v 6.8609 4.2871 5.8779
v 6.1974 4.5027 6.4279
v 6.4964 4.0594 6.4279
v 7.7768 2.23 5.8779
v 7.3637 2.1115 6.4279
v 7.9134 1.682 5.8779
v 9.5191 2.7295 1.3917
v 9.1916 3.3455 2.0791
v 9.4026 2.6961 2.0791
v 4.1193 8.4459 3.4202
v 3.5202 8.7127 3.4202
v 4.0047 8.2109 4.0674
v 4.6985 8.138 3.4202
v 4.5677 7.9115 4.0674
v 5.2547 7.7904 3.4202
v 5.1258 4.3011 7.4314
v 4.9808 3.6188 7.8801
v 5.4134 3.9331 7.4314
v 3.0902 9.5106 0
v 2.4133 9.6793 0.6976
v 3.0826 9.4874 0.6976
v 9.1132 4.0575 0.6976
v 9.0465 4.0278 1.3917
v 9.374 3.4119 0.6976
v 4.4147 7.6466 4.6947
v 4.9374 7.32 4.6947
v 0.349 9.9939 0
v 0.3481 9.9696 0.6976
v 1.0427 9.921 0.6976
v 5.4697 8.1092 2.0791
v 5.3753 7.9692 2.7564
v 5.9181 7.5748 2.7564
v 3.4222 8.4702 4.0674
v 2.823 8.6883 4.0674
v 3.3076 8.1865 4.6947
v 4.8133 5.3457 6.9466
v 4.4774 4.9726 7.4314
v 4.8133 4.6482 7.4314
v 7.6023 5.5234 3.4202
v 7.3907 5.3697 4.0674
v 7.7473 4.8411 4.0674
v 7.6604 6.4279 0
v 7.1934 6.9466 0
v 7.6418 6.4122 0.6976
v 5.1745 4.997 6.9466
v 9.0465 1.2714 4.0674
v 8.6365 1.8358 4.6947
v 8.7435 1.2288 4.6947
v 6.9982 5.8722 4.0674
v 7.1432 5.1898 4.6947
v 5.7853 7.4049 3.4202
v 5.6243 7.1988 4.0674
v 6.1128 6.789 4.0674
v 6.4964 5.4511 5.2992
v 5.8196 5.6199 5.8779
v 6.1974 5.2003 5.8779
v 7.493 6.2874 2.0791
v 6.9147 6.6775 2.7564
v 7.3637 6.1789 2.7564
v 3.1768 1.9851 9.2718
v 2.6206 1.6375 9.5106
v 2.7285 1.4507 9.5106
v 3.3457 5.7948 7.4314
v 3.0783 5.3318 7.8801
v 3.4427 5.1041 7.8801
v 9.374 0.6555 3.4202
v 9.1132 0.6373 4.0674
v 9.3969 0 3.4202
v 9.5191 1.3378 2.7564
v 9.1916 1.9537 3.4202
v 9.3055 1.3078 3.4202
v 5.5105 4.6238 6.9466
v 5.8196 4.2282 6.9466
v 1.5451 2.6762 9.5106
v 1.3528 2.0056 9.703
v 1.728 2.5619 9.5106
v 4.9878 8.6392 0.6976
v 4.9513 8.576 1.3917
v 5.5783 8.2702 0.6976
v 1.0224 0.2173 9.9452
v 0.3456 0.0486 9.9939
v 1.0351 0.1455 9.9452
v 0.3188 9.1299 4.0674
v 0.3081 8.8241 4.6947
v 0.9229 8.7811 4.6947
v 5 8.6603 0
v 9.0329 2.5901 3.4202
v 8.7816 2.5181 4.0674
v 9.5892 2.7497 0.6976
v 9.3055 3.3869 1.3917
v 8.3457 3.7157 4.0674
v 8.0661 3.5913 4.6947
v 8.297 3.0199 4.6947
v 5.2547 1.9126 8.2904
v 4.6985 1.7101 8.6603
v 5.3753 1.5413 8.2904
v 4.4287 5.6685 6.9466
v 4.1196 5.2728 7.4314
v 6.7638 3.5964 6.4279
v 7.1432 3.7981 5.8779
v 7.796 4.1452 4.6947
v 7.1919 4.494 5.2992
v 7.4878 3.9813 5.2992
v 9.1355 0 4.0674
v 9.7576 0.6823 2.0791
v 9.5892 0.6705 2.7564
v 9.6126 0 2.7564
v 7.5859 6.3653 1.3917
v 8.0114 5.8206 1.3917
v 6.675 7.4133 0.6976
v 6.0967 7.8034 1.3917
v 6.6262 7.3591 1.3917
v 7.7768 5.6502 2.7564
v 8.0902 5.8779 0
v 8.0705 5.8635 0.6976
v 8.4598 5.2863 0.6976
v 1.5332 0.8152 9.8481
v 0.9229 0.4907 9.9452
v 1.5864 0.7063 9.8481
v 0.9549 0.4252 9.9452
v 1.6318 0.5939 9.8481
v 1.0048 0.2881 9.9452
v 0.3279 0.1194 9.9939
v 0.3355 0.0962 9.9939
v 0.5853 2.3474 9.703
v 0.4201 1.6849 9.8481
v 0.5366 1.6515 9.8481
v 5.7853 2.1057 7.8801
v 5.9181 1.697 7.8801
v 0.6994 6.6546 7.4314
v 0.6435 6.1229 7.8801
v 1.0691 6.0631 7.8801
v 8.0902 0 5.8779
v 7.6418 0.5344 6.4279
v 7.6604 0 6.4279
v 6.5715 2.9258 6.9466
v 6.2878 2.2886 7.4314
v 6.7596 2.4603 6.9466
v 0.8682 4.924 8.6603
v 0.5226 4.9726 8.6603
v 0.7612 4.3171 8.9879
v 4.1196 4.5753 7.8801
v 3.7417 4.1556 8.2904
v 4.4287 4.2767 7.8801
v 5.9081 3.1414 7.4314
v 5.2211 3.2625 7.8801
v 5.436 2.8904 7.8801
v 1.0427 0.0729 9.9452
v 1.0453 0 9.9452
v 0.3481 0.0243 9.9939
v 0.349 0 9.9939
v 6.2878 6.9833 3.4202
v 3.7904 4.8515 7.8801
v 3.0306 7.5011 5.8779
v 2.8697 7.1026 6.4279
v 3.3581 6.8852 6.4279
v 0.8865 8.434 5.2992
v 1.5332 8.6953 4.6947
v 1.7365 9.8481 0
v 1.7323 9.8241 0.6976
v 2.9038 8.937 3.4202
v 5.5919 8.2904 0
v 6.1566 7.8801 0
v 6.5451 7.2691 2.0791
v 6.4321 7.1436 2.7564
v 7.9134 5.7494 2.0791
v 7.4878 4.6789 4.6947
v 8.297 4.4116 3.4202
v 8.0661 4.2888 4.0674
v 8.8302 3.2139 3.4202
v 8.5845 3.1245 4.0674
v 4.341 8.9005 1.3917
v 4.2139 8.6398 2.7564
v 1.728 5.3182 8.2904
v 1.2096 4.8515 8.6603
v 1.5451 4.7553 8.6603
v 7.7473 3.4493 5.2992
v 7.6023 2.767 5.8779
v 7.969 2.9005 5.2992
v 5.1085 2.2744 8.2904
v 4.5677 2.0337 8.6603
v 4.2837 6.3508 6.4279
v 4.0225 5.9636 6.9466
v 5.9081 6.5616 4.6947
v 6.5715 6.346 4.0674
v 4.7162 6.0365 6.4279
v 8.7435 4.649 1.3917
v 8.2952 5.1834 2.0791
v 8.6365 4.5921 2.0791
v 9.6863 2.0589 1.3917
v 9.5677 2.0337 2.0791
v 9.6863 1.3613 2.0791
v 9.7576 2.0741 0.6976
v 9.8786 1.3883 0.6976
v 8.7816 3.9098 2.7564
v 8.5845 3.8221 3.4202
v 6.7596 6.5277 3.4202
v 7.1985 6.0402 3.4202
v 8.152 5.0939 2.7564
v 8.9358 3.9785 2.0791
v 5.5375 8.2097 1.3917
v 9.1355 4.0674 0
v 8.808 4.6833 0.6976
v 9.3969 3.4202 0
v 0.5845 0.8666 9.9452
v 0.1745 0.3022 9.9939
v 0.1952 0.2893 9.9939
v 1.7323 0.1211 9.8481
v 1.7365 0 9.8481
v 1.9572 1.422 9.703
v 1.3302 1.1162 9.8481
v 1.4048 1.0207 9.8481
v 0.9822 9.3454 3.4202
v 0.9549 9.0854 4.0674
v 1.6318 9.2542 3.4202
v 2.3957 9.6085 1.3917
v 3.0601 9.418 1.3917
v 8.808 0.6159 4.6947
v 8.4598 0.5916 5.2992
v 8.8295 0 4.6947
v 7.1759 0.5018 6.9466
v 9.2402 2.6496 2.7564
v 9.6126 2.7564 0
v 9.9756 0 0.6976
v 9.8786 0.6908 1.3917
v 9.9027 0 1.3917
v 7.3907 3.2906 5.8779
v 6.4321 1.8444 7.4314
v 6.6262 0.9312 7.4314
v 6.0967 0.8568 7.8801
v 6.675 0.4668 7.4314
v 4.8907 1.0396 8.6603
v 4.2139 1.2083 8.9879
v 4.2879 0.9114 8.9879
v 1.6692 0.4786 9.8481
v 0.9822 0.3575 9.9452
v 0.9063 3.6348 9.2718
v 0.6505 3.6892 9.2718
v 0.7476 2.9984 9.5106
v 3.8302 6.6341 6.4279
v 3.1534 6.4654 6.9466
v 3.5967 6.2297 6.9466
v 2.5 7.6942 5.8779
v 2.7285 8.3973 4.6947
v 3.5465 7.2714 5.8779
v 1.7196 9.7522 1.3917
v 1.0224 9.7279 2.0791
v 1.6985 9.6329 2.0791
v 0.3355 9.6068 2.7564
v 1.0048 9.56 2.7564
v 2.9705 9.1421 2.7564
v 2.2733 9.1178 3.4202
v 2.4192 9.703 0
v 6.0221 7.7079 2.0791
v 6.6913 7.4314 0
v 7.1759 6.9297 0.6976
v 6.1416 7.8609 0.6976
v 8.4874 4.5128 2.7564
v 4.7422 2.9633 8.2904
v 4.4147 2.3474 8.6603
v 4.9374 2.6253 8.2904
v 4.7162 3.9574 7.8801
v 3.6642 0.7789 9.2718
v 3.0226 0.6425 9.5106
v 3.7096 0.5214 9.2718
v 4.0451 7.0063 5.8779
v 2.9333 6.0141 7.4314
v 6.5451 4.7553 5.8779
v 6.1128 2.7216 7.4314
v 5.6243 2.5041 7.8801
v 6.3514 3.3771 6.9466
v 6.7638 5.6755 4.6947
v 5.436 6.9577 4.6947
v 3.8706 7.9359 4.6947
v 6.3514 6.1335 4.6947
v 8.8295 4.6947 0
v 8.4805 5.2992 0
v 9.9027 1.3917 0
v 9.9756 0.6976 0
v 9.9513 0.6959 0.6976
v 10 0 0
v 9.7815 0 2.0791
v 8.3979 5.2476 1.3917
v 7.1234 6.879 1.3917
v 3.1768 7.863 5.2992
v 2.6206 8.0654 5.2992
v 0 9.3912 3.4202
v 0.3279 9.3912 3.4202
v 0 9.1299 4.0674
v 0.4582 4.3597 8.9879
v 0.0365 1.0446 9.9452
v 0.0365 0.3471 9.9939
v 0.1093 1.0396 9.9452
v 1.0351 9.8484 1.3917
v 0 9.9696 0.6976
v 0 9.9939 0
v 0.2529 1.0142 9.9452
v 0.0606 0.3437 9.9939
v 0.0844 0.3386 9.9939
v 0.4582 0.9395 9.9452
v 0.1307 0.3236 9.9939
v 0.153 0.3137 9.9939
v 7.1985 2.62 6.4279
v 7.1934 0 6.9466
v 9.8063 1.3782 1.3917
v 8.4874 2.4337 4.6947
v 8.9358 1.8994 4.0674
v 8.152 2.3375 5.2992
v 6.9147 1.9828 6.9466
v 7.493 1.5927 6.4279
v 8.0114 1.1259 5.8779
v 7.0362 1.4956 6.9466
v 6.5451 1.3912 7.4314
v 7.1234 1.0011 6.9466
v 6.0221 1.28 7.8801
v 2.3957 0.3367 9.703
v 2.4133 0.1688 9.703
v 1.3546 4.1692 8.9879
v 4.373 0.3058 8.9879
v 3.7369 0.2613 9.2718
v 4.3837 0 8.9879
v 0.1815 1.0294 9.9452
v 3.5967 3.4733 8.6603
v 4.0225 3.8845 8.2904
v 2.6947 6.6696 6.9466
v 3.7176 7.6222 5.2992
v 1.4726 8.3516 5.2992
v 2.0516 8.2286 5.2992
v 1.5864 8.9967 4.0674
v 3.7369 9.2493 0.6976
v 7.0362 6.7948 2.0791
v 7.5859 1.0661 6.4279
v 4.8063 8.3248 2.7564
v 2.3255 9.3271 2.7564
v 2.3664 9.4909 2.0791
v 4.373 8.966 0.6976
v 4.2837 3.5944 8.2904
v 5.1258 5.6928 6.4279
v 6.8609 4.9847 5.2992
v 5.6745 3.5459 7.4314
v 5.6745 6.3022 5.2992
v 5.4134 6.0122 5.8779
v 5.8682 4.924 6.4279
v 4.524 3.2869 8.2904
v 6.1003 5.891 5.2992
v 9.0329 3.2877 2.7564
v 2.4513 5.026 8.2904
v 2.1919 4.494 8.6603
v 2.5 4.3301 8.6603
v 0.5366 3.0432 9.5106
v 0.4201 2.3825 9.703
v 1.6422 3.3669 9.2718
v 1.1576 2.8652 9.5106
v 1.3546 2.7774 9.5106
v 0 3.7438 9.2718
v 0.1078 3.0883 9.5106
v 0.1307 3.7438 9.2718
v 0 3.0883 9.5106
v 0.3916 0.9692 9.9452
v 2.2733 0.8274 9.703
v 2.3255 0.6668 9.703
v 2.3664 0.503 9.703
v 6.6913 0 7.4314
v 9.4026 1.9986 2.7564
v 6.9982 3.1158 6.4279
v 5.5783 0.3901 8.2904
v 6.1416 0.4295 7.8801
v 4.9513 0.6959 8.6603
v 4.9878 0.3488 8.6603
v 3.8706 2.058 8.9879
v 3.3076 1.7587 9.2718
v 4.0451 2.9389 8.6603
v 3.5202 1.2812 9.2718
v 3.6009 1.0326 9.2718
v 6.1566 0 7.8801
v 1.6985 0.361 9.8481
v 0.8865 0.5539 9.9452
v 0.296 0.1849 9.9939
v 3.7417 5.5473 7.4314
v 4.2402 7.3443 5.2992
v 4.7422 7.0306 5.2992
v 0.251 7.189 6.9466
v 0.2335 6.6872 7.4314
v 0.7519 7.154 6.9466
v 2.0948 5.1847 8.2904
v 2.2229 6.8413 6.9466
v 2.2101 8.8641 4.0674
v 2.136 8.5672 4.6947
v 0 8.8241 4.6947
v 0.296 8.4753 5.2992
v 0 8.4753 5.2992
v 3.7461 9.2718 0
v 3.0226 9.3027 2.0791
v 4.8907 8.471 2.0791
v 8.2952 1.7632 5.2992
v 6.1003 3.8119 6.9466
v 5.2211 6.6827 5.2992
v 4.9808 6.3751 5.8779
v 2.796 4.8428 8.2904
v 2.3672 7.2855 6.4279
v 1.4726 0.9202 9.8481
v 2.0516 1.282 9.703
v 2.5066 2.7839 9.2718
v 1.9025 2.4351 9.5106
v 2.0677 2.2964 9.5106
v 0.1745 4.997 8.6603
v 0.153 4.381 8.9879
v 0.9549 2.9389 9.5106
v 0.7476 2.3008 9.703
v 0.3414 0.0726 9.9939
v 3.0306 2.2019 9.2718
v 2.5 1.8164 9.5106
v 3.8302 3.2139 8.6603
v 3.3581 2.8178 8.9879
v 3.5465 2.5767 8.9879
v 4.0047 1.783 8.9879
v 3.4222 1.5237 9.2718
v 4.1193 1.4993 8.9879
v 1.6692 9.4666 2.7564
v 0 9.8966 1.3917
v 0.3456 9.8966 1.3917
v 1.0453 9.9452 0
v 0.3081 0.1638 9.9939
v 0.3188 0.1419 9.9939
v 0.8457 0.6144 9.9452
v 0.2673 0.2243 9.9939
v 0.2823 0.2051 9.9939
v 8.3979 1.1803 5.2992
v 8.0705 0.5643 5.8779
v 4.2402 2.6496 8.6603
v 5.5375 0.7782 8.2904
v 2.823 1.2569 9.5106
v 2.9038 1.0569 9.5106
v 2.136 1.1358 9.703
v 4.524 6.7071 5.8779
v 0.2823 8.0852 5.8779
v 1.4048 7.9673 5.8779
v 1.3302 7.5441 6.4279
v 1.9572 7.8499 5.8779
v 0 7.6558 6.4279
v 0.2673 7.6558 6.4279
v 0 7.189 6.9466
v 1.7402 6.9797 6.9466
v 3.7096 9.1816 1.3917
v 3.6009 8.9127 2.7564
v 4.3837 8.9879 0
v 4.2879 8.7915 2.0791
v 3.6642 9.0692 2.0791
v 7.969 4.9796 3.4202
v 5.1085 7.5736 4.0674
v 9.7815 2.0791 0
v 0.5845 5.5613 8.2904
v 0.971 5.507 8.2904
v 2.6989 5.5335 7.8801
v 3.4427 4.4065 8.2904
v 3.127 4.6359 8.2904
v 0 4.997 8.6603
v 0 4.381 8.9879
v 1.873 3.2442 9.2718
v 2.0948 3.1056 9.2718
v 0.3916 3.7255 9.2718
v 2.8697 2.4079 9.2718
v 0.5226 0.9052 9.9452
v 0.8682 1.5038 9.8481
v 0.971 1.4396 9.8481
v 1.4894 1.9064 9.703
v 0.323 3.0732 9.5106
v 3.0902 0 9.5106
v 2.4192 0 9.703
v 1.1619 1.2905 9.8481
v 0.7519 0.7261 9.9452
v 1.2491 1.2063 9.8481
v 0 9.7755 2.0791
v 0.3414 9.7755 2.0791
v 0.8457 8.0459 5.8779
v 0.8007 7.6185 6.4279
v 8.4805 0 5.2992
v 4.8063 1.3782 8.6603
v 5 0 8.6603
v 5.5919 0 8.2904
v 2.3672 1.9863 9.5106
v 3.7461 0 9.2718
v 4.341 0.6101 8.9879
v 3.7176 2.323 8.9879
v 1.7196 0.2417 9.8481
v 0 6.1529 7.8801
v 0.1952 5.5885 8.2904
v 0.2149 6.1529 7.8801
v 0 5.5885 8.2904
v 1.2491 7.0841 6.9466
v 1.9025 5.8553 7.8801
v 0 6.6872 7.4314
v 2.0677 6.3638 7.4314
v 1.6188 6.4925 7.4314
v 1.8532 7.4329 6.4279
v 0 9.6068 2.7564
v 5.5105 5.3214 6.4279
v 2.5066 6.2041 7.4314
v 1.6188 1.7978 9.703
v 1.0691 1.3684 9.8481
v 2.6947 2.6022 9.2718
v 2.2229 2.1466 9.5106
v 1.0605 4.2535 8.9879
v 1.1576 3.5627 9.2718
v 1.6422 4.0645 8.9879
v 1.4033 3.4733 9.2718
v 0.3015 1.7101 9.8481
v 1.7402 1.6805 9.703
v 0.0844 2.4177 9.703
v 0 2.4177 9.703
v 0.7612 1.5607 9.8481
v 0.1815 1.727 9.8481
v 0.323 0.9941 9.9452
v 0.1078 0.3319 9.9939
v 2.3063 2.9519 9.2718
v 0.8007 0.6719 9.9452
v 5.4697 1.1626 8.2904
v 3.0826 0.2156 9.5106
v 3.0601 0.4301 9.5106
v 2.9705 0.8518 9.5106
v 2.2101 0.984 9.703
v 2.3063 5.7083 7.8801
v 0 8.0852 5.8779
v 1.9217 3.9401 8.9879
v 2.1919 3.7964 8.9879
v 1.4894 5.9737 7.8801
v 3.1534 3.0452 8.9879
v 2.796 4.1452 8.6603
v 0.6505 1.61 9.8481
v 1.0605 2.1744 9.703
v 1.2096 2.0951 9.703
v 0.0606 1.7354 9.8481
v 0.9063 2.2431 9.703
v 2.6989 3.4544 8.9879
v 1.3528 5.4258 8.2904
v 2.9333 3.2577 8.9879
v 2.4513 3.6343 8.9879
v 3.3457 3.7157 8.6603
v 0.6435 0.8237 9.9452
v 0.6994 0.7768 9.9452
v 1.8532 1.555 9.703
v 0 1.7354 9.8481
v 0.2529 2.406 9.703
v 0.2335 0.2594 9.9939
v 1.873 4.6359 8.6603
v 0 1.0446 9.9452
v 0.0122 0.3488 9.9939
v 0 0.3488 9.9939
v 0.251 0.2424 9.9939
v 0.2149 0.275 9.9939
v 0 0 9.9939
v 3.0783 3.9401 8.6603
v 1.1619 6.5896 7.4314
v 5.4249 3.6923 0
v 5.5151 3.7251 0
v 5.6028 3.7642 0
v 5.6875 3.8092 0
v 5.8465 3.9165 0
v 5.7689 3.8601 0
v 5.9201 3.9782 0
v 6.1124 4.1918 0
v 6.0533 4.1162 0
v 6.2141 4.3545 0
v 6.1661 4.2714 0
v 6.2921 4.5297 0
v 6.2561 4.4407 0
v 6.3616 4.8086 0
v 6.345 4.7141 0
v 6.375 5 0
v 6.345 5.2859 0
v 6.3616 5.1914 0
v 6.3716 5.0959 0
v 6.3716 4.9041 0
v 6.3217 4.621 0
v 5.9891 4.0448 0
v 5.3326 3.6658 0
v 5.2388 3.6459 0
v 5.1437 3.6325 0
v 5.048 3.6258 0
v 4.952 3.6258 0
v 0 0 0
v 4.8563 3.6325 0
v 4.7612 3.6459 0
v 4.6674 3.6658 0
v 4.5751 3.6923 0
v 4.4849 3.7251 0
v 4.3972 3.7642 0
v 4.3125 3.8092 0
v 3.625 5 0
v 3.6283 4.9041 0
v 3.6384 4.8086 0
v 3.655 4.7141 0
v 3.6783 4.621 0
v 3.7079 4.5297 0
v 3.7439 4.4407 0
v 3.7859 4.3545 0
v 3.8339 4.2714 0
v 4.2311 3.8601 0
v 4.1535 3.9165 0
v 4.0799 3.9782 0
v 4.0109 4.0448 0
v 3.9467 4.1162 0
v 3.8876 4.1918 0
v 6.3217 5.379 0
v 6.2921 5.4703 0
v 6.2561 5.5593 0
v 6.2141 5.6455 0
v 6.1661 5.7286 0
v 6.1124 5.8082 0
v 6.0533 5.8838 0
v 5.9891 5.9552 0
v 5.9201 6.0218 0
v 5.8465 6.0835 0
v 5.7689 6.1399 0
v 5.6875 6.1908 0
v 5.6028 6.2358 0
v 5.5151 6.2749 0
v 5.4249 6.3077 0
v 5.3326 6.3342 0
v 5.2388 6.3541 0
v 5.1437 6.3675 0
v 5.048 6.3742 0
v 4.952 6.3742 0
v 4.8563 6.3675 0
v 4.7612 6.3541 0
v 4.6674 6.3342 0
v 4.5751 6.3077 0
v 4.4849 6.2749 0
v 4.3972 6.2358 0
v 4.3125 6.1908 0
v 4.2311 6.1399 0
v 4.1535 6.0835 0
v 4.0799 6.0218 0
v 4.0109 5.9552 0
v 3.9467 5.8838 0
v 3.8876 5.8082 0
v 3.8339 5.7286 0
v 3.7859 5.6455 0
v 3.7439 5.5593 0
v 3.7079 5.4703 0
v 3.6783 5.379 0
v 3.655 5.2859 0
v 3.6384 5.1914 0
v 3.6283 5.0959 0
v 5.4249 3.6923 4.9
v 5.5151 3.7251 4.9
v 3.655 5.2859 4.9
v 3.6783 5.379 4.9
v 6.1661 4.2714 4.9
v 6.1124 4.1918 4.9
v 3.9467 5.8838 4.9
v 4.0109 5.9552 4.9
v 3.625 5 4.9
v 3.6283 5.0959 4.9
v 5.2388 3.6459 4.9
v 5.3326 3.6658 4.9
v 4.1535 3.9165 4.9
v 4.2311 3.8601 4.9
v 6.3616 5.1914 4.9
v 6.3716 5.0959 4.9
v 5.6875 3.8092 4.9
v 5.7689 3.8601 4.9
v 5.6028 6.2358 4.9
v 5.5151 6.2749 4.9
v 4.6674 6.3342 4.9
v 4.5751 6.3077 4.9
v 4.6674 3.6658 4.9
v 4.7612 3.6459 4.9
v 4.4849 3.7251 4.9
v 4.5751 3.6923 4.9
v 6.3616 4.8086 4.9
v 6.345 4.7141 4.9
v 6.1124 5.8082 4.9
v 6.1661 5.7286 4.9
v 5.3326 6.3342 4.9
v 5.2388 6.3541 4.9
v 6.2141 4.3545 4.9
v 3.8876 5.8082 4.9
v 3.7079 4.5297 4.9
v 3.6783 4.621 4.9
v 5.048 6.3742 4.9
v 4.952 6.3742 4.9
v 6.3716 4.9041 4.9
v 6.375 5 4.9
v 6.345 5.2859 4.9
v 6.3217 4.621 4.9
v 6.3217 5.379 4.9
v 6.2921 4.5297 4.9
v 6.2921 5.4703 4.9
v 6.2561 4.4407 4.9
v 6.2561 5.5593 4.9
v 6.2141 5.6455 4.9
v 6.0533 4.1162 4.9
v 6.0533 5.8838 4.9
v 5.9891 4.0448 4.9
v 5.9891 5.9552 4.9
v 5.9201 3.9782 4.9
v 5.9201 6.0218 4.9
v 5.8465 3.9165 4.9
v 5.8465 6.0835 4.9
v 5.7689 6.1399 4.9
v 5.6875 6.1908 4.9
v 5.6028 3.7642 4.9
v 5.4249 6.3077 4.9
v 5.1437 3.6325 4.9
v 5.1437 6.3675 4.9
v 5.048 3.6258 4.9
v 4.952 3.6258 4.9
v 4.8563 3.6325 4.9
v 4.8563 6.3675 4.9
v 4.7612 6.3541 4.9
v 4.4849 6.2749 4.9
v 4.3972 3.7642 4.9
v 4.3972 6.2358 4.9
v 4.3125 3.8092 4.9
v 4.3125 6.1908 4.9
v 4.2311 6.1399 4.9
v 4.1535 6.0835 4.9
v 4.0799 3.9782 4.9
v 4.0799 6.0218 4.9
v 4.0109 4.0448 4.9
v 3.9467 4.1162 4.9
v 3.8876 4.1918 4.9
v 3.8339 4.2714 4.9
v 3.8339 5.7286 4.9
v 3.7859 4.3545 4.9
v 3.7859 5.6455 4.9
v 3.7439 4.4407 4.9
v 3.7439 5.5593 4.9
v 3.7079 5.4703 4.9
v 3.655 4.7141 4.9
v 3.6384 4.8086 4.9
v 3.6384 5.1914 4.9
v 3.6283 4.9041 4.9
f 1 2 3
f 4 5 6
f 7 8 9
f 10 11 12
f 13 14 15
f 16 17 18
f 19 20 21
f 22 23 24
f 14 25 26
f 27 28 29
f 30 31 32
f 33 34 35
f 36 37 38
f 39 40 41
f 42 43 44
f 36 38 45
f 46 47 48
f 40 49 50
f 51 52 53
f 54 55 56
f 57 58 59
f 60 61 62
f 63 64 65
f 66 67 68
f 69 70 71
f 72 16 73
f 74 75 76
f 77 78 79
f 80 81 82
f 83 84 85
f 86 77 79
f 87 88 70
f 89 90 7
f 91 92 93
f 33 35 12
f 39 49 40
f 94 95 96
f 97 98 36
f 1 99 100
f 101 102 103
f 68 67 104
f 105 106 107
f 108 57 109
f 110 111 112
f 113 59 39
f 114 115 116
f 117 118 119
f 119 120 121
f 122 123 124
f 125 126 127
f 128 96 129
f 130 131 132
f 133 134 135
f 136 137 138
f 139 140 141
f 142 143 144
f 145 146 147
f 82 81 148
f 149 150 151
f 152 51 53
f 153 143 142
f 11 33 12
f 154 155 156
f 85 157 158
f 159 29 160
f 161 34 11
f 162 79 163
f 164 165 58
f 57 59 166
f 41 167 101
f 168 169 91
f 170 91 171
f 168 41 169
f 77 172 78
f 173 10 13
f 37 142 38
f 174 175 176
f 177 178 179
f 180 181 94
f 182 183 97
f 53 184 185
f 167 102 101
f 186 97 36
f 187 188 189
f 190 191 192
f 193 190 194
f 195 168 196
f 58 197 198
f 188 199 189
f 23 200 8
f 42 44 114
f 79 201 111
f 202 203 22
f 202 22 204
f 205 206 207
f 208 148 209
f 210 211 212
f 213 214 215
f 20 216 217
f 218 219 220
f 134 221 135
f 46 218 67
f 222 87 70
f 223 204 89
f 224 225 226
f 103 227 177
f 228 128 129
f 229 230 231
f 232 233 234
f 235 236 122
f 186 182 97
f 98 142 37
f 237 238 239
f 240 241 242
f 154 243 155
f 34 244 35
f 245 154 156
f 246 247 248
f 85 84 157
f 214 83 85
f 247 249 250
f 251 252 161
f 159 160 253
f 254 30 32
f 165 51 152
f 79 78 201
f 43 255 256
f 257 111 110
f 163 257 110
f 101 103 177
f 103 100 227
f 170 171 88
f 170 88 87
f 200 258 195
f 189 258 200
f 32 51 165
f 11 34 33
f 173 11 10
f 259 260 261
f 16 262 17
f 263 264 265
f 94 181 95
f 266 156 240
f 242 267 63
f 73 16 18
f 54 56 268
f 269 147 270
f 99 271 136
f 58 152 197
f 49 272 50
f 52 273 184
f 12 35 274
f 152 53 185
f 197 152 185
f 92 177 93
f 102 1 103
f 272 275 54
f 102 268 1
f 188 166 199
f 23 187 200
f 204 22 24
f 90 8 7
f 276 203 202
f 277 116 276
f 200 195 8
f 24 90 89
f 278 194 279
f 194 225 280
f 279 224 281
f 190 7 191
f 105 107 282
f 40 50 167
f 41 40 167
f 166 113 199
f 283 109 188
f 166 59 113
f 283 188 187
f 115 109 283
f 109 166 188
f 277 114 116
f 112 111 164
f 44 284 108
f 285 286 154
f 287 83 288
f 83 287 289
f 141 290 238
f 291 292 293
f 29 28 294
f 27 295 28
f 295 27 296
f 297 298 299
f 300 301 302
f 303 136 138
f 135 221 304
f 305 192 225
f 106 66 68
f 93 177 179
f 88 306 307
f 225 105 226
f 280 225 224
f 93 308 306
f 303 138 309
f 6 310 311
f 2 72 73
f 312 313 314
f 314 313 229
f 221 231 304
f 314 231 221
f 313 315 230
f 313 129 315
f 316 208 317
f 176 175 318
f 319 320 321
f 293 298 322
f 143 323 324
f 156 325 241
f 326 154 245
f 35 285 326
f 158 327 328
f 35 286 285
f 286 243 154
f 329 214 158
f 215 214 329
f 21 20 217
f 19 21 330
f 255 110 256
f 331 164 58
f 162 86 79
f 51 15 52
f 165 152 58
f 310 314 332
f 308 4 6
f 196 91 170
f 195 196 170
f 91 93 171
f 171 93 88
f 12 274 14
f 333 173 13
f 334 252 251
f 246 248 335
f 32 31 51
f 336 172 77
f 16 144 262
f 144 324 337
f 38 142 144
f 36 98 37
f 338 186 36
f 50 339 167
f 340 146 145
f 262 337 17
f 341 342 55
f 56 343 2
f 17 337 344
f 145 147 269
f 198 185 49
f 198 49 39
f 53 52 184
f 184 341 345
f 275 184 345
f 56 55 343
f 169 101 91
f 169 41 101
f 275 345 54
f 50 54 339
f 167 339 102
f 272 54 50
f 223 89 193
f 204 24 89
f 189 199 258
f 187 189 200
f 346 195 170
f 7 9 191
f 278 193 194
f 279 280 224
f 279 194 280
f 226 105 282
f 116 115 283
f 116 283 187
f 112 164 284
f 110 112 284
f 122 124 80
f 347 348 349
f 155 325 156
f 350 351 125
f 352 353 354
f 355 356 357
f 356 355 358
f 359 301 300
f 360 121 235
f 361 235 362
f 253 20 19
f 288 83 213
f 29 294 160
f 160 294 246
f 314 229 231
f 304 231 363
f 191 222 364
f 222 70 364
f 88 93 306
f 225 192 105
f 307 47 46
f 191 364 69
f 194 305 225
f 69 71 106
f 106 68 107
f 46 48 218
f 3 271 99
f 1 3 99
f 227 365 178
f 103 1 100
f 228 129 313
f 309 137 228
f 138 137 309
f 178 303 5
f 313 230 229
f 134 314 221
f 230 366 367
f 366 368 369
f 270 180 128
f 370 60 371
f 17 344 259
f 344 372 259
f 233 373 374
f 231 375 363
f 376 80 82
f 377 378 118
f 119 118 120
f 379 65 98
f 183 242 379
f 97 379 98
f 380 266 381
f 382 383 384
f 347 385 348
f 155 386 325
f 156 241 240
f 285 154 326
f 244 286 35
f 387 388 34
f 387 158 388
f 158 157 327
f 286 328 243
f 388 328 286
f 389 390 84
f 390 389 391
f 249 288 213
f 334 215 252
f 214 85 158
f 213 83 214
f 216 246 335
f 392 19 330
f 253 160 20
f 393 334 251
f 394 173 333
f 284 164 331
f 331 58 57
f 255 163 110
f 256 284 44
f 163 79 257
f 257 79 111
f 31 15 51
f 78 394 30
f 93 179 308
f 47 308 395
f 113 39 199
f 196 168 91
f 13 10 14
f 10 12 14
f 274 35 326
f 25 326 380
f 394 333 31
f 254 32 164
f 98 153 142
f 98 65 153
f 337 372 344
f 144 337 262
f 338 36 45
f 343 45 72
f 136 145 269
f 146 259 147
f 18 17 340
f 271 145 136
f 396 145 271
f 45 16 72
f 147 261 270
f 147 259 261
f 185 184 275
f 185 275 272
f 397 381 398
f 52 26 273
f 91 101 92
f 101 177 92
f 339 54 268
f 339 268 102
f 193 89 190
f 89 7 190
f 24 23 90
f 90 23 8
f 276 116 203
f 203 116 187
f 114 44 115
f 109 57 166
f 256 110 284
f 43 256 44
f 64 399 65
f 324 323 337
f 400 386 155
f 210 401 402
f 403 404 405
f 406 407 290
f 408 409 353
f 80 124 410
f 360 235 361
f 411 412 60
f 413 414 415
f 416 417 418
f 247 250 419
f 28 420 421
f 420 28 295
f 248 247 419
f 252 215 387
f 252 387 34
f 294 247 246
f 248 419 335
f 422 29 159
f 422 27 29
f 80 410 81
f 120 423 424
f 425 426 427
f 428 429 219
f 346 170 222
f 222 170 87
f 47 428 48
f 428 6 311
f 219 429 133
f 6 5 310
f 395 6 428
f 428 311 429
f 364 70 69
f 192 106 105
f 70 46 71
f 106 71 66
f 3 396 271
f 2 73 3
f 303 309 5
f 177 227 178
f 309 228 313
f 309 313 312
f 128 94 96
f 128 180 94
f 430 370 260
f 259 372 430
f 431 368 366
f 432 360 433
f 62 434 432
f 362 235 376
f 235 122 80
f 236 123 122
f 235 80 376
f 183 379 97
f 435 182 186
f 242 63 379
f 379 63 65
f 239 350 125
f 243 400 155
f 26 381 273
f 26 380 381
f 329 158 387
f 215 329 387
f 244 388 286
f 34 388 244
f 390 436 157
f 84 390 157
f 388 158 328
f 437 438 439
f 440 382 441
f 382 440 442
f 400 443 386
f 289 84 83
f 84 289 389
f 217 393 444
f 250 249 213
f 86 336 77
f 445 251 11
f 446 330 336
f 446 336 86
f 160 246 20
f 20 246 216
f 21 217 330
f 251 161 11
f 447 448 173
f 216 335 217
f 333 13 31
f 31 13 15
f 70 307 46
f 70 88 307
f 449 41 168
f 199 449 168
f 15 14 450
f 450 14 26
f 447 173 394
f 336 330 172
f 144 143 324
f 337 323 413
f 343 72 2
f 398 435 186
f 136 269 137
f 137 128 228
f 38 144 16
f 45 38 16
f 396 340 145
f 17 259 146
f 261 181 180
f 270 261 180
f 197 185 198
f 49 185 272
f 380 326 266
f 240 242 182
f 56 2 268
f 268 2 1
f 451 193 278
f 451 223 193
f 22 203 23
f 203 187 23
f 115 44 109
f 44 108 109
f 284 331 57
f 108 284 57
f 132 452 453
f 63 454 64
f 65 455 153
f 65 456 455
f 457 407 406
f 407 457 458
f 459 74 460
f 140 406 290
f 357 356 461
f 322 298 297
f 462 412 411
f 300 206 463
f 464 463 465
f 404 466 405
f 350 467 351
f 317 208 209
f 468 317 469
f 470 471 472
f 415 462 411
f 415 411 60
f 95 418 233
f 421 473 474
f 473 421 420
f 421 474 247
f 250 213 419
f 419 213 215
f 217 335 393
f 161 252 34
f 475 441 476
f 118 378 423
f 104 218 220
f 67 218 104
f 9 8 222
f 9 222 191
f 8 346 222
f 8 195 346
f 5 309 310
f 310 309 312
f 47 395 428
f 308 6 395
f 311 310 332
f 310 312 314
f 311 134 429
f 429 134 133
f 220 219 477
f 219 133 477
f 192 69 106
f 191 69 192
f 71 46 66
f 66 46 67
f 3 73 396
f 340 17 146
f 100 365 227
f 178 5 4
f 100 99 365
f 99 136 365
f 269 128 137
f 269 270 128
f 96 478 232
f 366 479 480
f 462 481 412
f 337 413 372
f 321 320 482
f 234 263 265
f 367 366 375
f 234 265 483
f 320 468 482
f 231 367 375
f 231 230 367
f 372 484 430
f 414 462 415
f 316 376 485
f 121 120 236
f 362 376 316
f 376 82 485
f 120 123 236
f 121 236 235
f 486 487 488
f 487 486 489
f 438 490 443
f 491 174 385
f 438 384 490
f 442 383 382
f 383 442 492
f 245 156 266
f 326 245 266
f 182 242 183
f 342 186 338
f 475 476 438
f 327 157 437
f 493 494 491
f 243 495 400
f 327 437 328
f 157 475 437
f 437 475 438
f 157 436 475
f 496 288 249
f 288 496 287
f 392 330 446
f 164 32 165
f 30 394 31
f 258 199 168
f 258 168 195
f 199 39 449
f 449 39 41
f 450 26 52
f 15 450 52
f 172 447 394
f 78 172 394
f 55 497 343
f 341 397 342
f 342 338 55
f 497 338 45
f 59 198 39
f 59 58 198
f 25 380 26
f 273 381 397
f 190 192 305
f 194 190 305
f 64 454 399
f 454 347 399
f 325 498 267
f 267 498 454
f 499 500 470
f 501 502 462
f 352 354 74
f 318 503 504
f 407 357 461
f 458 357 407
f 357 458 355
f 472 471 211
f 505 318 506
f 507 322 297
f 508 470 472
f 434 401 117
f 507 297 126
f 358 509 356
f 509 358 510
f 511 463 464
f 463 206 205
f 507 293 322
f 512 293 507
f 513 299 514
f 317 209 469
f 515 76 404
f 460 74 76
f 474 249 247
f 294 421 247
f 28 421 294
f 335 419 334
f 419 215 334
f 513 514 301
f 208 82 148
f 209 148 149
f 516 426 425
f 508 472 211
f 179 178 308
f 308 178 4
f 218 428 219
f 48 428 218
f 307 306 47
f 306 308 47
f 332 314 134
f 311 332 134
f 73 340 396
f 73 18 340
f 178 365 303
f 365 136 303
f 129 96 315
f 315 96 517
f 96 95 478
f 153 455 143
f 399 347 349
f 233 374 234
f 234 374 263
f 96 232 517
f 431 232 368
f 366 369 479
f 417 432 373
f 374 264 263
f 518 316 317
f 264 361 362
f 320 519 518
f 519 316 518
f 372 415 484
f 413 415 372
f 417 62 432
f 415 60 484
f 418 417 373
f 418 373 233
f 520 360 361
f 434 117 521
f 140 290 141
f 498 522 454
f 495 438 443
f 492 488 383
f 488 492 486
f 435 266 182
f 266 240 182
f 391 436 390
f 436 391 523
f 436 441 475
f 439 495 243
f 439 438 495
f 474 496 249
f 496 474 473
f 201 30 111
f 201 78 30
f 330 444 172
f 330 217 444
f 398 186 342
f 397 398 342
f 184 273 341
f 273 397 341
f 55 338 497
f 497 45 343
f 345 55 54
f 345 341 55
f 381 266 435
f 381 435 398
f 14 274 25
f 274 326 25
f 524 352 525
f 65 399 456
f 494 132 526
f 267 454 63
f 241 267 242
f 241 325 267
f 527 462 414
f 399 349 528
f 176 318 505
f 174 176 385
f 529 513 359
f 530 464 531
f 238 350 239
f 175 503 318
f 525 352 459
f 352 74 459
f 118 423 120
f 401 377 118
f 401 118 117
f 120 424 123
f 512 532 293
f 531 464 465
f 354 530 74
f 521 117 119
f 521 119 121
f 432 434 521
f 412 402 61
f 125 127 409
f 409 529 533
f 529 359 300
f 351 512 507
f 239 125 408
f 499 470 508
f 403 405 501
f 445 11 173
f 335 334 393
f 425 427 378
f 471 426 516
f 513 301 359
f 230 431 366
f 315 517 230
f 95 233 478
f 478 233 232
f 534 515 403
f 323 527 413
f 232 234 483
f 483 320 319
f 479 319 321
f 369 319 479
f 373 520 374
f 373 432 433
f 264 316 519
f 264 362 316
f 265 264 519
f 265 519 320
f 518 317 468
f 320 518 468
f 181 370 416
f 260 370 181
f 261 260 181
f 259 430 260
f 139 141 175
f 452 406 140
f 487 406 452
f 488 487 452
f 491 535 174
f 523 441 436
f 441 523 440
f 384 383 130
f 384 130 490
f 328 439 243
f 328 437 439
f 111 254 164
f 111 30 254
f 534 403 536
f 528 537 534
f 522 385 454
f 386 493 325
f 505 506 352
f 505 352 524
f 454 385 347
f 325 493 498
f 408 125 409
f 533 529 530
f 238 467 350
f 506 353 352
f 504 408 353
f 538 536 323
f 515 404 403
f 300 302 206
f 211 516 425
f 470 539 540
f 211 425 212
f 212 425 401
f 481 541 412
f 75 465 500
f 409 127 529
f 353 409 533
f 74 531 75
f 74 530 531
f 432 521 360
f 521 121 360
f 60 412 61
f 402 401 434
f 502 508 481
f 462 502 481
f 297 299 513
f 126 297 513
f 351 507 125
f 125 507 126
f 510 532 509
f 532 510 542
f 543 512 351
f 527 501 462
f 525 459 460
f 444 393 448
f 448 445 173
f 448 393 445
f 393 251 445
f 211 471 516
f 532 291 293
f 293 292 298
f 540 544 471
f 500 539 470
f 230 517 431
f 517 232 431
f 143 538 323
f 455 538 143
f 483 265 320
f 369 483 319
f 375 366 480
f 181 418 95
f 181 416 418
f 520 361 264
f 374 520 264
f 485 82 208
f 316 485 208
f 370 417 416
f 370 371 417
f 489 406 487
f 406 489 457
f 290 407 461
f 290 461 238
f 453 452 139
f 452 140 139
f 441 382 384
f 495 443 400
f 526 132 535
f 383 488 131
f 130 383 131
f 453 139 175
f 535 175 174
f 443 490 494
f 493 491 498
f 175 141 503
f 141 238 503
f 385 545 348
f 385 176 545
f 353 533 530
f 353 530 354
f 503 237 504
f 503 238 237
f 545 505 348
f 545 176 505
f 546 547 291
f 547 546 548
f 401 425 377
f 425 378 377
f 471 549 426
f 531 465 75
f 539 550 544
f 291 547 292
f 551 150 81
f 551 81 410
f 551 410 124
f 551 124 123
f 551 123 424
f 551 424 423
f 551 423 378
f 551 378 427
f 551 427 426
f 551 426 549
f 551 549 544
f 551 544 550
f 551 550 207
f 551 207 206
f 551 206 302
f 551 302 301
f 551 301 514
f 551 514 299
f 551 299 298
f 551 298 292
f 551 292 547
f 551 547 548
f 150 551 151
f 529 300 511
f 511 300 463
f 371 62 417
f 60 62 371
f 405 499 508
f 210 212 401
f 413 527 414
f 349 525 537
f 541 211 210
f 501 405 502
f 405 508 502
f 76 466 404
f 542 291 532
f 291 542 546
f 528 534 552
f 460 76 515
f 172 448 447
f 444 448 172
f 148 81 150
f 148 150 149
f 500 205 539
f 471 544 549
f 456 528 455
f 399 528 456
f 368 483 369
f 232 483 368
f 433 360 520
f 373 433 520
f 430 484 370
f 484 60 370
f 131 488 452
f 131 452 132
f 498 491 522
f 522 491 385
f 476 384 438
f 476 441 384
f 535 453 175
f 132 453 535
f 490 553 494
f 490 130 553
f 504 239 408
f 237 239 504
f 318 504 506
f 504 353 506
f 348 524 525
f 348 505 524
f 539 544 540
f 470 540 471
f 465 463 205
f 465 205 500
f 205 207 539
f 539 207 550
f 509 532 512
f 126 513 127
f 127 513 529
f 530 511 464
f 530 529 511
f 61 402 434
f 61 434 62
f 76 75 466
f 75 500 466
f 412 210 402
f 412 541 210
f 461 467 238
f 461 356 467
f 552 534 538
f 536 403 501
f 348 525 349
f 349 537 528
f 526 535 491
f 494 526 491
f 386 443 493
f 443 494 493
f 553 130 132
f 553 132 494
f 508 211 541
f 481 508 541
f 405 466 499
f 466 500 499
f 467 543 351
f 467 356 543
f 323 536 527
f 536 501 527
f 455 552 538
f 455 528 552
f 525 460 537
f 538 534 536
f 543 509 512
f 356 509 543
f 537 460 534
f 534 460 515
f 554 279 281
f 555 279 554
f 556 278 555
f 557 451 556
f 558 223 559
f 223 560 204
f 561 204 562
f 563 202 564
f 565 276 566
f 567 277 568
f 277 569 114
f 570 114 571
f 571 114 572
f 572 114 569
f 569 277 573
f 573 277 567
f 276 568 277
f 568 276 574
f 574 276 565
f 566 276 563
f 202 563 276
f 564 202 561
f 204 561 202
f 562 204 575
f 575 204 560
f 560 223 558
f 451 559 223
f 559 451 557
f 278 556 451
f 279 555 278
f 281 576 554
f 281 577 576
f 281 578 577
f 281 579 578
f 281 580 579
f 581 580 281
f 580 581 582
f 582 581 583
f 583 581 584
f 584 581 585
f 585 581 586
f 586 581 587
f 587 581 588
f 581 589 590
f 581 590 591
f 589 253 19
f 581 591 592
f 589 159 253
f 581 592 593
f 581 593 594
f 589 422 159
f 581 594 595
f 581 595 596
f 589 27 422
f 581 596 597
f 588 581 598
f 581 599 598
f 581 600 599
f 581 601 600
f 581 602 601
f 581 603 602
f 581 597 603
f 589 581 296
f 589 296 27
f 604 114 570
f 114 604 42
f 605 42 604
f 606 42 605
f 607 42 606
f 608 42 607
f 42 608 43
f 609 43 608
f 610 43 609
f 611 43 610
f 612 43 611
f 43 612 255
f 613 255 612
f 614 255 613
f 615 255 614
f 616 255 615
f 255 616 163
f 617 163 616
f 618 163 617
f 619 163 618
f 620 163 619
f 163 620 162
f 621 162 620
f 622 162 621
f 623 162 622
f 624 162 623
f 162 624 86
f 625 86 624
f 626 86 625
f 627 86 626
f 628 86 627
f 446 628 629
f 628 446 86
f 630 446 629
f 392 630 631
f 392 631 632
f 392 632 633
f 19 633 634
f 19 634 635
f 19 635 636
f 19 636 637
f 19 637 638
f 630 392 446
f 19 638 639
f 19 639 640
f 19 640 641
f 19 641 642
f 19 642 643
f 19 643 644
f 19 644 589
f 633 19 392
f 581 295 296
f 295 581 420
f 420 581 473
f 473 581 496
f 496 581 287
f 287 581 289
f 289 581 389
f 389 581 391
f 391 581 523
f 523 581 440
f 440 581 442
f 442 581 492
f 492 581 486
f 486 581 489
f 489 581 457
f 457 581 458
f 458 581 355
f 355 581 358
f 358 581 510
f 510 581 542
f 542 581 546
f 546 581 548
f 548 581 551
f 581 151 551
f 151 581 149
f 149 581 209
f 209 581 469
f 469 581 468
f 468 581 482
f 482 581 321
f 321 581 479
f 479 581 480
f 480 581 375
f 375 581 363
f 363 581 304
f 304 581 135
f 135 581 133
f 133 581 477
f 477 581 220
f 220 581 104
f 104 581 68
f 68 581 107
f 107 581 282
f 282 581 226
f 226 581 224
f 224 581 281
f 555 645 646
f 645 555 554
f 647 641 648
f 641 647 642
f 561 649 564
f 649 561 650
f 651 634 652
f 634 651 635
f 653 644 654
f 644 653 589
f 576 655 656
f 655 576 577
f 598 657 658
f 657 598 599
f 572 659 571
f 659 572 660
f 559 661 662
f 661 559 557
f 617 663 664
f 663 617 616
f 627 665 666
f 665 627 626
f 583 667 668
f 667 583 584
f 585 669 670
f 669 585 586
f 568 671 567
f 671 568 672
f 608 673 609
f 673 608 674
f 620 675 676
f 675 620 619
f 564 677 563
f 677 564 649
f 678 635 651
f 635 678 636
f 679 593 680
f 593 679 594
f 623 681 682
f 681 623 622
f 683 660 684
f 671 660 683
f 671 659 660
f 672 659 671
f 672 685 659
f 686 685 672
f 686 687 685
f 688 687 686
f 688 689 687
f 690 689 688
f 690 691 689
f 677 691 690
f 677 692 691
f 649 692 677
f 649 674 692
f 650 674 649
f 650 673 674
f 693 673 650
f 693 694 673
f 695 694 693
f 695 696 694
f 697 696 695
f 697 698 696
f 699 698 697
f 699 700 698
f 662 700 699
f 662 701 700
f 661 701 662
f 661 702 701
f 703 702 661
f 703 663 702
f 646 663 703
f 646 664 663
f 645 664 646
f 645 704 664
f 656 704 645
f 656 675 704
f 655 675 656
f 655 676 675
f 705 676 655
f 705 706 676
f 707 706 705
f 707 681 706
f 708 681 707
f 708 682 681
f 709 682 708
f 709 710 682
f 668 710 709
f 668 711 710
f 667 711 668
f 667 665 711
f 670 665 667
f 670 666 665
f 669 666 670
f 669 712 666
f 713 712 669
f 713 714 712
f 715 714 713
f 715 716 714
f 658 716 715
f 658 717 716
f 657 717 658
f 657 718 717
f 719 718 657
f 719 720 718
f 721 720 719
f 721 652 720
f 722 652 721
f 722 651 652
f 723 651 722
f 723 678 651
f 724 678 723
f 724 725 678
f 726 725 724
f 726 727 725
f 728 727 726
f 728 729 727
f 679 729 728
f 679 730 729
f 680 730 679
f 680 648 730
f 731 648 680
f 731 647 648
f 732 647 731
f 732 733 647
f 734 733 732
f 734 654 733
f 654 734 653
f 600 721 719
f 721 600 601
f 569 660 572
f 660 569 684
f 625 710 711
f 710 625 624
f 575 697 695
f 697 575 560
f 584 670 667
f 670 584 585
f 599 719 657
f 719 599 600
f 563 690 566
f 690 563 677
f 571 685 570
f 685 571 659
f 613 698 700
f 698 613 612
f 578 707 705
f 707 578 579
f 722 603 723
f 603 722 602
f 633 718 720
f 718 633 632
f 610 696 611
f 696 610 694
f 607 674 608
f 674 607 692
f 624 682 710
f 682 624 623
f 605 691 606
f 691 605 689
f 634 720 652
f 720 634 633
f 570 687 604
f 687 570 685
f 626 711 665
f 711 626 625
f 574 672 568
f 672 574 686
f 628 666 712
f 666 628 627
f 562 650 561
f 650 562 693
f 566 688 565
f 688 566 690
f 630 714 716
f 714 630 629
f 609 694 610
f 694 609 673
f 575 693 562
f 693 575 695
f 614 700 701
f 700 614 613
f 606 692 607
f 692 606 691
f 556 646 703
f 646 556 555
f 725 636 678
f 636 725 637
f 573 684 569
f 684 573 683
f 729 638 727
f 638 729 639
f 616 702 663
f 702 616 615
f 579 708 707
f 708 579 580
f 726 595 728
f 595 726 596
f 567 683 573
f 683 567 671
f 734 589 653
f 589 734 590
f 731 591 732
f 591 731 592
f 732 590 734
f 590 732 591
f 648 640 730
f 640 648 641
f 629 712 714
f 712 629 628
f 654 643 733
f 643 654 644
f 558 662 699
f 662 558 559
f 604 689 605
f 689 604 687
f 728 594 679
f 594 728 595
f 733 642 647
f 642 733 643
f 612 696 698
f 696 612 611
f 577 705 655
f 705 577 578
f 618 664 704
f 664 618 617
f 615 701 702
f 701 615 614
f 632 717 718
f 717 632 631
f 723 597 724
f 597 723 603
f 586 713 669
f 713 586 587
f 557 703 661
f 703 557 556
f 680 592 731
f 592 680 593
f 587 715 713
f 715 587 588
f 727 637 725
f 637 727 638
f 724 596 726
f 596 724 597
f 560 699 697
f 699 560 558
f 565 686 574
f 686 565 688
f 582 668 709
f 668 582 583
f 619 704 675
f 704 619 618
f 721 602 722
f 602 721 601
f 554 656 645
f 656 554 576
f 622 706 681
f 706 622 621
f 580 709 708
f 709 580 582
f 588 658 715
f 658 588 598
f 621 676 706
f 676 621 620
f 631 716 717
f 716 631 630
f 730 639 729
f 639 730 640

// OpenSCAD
// file: _common.scad
$fa=4; // default minimum facet angle is now 0.5
$fs=0.05; // defaul

wallThickness = 2;
caseWidth = 120;
caseHeight = 50;
caseDepth = 75;

m3ScrewHoleRad = 1.375;
m3LooseScrewHoleRad = m3ScrewHoleRad + .25;

tabThickness = wallThickness;
tabWidth = 10;
tabLen = 5;

screwDepth = 15;

ledStripWidth = 11;

sideLen = 203;

dioramaWidth = caseWidth + 3 + wallThickness * 2;

bottomHeight = caseHeight + 10;

backDepth = 10;
frontDepth = 5;

wiringCutoutHeight = dioramaWidth * (3/4);

acrylicThickness = 2.25;
woodThickness = 5.2;

miniBaseRad = 53 / 2;
topShelfLen = 100;
topShelfThickness = 5;

edgeLen = sideLen - bottomHeight;
edgeWidth = 10;

reedSwitchWidth = 3;

breakawayDistance = .2;
// main file
include <_common.scad>

difference() {
  intersection() {
    sphere(r = edgeWidth);
    cube([edgeWidth, edgeWidth, edgeWidth]);
  }

  #translate([edgeWidth / 2, edgeWidth / 2, -.1]) cylinder(r = m3ScrewHoleRad, h = edgeWidth / 2);
}
